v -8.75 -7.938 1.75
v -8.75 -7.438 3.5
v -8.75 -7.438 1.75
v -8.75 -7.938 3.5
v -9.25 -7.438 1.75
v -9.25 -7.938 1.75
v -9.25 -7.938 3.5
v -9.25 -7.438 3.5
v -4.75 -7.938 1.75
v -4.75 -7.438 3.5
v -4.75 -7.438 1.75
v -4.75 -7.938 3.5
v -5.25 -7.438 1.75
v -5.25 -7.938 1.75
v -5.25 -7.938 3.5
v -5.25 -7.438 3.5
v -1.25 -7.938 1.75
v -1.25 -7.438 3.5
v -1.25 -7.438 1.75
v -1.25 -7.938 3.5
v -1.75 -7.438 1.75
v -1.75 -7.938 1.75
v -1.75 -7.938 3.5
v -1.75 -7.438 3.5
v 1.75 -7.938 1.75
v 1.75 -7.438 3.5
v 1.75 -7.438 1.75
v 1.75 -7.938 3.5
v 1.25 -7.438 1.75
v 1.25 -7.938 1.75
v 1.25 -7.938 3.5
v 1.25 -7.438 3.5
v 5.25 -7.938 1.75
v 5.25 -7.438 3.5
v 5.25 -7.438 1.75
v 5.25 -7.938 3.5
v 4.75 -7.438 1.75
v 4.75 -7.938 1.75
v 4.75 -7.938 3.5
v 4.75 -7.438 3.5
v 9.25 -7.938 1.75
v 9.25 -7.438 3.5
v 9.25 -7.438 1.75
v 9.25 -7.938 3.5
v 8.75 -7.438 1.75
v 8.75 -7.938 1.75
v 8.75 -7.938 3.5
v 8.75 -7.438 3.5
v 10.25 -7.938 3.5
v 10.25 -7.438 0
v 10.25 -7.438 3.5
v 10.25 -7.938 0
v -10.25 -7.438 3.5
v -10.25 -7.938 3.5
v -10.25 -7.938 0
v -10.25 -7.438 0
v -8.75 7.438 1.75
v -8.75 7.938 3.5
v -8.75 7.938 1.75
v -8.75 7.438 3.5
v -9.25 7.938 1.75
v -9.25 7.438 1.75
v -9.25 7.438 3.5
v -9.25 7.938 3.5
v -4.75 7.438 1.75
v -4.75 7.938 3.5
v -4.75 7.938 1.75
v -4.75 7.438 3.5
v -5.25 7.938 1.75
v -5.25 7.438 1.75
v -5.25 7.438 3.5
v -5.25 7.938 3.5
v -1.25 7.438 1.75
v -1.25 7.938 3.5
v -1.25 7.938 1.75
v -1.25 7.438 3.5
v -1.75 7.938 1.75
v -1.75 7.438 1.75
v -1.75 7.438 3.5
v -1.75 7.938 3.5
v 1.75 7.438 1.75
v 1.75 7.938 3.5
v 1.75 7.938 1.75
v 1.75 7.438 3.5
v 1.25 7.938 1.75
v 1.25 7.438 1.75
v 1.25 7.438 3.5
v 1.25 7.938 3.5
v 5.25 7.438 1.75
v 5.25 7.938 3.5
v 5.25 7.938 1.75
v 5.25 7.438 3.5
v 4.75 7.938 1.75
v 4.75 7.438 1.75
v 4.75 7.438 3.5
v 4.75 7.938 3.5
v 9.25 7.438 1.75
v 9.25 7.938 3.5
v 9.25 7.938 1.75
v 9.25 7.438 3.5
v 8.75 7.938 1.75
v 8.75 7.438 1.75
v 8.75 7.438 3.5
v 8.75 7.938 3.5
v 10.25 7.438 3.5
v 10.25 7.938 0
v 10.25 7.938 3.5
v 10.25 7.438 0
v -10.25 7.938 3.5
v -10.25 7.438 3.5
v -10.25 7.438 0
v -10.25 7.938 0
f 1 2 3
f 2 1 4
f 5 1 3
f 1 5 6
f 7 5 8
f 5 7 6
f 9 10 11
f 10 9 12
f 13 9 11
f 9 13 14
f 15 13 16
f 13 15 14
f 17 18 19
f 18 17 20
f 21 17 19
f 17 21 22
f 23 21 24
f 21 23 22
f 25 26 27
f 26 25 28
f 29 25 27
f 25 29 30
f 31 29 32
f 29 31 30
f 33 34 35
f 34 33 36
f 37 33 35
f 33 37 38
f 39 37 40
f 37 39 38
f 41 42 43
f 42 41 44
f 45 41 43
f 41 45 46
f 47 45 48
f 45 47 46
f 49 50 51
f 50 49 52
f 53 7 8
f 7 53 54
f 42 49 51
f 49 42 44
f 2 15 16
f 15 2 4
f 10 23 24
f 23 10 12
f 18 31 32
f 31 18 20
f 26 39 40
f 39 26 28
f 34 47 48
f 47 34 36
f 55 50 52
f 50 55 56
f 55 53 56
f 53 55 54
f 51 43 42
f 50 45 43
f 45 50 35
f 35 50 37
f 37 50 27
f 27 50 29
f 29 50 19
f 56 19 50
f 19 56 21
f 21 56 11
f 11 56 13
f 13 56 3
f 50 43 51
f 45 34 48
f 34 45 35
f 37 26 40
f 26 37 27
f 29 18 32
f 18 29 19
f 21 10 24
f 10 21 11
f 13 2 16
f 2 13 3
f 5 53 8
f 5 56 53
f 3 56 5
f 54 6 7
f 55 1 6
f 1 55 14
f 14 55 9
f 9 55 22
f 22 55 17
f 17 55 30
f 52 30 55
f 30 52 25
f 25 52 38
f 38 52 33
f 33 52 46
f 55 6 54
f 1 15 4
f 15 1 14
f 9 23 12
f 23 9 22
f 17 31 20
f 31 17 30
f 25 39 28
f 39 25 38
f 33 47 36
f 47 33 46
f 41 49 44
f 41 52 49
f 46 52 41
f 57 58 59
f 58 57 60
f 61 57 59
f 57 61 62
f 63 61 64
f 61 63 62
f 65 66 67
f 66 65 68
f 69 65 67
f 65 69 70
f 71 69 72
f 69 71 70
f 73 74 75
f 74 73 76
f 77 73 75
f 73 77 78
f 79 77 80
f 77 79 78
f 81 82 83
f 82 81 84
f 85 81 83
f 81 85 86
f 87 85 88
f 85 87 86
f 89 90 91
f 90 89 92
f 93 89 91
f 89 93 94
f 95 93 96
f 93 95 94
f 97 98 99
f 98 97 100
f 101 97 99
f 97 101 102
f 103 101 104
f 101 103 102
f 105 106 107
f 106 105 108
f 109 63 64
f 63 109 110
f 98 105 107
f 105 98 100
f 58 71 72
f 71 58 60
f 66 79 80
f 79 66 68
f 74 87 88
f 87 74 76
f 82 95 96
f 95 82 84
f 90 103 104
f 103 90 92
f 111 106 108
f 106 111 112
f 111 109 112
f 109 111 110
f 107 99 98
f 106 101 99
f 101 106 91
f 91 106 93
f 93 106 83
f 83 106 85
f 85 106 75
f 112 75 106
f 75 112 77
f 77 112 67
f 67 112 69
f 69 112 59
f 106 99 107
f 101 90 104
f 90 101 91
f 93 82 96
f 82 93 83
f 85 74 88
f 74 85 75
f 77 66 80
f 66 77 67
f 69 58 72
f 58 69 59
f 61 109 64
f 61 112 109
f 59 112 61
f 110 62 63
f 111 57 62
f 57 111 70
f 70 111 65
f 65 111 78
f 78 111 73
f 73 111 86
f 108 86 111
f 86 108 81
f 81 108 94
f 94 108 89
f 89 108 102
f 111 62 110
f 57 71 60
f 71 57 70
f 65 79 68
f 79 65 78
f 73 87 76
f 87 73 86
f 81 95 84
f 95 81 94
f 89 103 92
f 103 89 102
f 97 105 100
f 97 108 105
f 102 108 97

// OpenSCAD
// file: layout.scad
// Rack layout geometry. Include config.scad once before this file.
// Functions are ordered so each name is defined before use (OpenSCAD 2021).

function rack_center_x() = 0;
function rack_center_y() = 0;

function x_divider_center_x(i) =
  rack_center_x() + divider_offset_from_center_in[i];

function divider_inner_left_x() =
  x_divider_center_x(0) + wall_thickness_in / 2;
function divider_inner_right_x() =
  x_divider_center_x(num_rows) - wall_thickness_in / 2;

function end_wall_inner_front_y() =
  rack_center_y() + end_wall_inner_offset_from_center_y[0];
function end_wall_inner_back_y() =
  rack_center_y() + end_wall_inner_offset_from_center_y[1];

function footprint_d_in() = max(
  end_wall_inner_back_y() - end_wall_inner_front_y(),
  (tubes_per_row - 1) * row_depth_in + tube_od_in
);

function layout_half_span_in() =
  max(
    max([for (i = [0 : num_rows - 1]) abs(column_tube_offset_from_center_in[i])])
      + tube_od_in / 2,
    max([for (i = [0 : num_rows]) abs(divider_offset_from_center_in[i])])
      + wall_thickness_in / 2
  );

function end_wall_w_in() =
  x_divider_center_x(num_rows) - x_divider_center_x(0) + wall_thickness_in
    + 2 * end_wall_extension_in;
function end_wall_x0() =
  x_divider_center_x(0) - wall_thickness_in / 2 - end_wall_extension_in;
function end_wall_height_in() = wall_height_in;

function tube_center_y(col_i) =
  rack_center_y() + depth_tube_offset_from_center_in[col_i];

function column_board_length_in() = footprint_d_in() + column_board_extension_in;
function column_board_y0() =
  rack_center_y() - column_board_length_in() / 2;
function board_half_lap_z_in() = wall_height_in / 2;

function footprint_w_in() = max(
  divider_inner_right_x() - divider_inner_left_x(),
  2 * (layout_half_span_in() + tilt_pad_x_in)
);

function bay_center_x(row_i) =
  rack_center_x() + column_tube_offset_from_center_in[row_i];
// file: config.scad
// Finale mortar rack — shared parameters (inches unless noted)

// --- Tubes (inventory) ---
tube_od_in = 2.375;
tube_length_in = 12;
shell_nominal_in = 2; // Class C 2 in. mortars

// --- Layout ---
num_rows = 5;
tubes_per_row = 5; // 5×5 per rack × 2 racks = 50 tubes (Commander finale)
num_dividers_x = num_rows + 1; // 6 green boards: left side + 4 between columns + right side
board_thickness_in = 0.5;
tube_gap_in = 0.25; // extra clearance inside each cell
row_spacing_in = tube_od_in + board_thickness_in + tube_gap_in;
row_depth_in = tube_od_in + board_thickness_in + tube_gap_in;

// --- Column layout (+X = right, from rack center) ---
column_tube_offset_from_center_in = [
  -6.5, // 0 outer left
  -3, // 1 middle left
  0,      // 2 center
  3,  // 3 middle right
  6.5,  // 4 outer right
];
divider_offset_from_center_in = [
  -9,     // 0 left side (outer)
  -5,     // 1 outer left | middle left
  -1.5,   // 2 middle left | center
  1.5,    // 3 center | middle right
  5,      // 4 middle right | outer right
  9,      // 5 right side (outer)
];

// --- Depth layout (+Y = toward back, from rack center) ---
depth_tube_offset_from_center_in = [
  -6.25, // 0 front
  -3.125,
  0,     // 2 center
  3.125,
  6.25,  // 4 back
];
end_wall_inner_offset_from_center_y = [
  -7.438, // front inner face
  7.438,  // back inner face
];

column_board_extension_in = 3; // +length along Y total (1-1/2 in. each end), centered on rack Y
end_wall_extension_in = 1; // brown ends: +1 in. per side in X (panel plane)
column_end_half_lap = true; // half-lap: columns lose bottom half, rows lose top half

// --- Angles (degrees from vertical; left negative, right positive) ---
outer_angle_deg = 12;

function row_offset(i) = i - floor(num_rows / 2); // -2 .. +2 for 5 rows
function sign(x) = x < 0 ? -1 : (x > 0 ? 1 : 0);
function row_angle_deg(i) =
  let (o = row_offset(i))
  o == 0 ? 0 : sign(o) * outer_angle_deg * abs(o) / 2;

tilt_pad_x_in = tube_length_in * sin(outer_angle_deg) + tube_gap_in;

// --- Structure (1/2 in. plywood walls only) ---
wall_thickness_in = 0.5;
wall_height_in = 3.5; // row boards + column boards (same height)

color_wall_end = [0.90, 0.62, 0.38];
color_wall_side = [0.58, 0.72, 0.42];
color_tube = [0.25, 0.45, 0.85, 0.85];

// --- Preview ---
preview = true;
$fn = preview ? 24 : 72;
show_tubes = true;
show_walls = true; // brown front/back ends
show_x_column_boards = true; // six green dividers along +X
// main file
// Brown front/back row boards — open this file directly to preview.
include <config.scad>
include <layout.scad>

module row_board_bottom(y_outer) {
  lap = board_half_lap_z_in();
  eps = 0.02;
  color(color_wall_end)
    difference() {
      translate([end_wall_x0(), y_outer, 0])
        cube([end_wall_w_in(), wall_thickness_in, end_wall_height_in()]);
      if (column_end_half_lap)
        for (i = [0 : num_rows])
          translate([
            x_divider_center_x(i) - wall_thickness_in / 2,
            y_outer - eps,
            lap
          ])
            cube([
              wall_thickness_in,
              wall_thickness_in + 2 * eps,
              lap + eps
            ]);
    }
}

module row_boards_bottom() {
  iy0 = end_wall_inner_front_y();
  iy1 = end_wall_inner_back_y();
  row_board_bottom(iy0 - wall_thickness_in);
  row_board_bottom(iy1);
}

row_boards_bottom();
